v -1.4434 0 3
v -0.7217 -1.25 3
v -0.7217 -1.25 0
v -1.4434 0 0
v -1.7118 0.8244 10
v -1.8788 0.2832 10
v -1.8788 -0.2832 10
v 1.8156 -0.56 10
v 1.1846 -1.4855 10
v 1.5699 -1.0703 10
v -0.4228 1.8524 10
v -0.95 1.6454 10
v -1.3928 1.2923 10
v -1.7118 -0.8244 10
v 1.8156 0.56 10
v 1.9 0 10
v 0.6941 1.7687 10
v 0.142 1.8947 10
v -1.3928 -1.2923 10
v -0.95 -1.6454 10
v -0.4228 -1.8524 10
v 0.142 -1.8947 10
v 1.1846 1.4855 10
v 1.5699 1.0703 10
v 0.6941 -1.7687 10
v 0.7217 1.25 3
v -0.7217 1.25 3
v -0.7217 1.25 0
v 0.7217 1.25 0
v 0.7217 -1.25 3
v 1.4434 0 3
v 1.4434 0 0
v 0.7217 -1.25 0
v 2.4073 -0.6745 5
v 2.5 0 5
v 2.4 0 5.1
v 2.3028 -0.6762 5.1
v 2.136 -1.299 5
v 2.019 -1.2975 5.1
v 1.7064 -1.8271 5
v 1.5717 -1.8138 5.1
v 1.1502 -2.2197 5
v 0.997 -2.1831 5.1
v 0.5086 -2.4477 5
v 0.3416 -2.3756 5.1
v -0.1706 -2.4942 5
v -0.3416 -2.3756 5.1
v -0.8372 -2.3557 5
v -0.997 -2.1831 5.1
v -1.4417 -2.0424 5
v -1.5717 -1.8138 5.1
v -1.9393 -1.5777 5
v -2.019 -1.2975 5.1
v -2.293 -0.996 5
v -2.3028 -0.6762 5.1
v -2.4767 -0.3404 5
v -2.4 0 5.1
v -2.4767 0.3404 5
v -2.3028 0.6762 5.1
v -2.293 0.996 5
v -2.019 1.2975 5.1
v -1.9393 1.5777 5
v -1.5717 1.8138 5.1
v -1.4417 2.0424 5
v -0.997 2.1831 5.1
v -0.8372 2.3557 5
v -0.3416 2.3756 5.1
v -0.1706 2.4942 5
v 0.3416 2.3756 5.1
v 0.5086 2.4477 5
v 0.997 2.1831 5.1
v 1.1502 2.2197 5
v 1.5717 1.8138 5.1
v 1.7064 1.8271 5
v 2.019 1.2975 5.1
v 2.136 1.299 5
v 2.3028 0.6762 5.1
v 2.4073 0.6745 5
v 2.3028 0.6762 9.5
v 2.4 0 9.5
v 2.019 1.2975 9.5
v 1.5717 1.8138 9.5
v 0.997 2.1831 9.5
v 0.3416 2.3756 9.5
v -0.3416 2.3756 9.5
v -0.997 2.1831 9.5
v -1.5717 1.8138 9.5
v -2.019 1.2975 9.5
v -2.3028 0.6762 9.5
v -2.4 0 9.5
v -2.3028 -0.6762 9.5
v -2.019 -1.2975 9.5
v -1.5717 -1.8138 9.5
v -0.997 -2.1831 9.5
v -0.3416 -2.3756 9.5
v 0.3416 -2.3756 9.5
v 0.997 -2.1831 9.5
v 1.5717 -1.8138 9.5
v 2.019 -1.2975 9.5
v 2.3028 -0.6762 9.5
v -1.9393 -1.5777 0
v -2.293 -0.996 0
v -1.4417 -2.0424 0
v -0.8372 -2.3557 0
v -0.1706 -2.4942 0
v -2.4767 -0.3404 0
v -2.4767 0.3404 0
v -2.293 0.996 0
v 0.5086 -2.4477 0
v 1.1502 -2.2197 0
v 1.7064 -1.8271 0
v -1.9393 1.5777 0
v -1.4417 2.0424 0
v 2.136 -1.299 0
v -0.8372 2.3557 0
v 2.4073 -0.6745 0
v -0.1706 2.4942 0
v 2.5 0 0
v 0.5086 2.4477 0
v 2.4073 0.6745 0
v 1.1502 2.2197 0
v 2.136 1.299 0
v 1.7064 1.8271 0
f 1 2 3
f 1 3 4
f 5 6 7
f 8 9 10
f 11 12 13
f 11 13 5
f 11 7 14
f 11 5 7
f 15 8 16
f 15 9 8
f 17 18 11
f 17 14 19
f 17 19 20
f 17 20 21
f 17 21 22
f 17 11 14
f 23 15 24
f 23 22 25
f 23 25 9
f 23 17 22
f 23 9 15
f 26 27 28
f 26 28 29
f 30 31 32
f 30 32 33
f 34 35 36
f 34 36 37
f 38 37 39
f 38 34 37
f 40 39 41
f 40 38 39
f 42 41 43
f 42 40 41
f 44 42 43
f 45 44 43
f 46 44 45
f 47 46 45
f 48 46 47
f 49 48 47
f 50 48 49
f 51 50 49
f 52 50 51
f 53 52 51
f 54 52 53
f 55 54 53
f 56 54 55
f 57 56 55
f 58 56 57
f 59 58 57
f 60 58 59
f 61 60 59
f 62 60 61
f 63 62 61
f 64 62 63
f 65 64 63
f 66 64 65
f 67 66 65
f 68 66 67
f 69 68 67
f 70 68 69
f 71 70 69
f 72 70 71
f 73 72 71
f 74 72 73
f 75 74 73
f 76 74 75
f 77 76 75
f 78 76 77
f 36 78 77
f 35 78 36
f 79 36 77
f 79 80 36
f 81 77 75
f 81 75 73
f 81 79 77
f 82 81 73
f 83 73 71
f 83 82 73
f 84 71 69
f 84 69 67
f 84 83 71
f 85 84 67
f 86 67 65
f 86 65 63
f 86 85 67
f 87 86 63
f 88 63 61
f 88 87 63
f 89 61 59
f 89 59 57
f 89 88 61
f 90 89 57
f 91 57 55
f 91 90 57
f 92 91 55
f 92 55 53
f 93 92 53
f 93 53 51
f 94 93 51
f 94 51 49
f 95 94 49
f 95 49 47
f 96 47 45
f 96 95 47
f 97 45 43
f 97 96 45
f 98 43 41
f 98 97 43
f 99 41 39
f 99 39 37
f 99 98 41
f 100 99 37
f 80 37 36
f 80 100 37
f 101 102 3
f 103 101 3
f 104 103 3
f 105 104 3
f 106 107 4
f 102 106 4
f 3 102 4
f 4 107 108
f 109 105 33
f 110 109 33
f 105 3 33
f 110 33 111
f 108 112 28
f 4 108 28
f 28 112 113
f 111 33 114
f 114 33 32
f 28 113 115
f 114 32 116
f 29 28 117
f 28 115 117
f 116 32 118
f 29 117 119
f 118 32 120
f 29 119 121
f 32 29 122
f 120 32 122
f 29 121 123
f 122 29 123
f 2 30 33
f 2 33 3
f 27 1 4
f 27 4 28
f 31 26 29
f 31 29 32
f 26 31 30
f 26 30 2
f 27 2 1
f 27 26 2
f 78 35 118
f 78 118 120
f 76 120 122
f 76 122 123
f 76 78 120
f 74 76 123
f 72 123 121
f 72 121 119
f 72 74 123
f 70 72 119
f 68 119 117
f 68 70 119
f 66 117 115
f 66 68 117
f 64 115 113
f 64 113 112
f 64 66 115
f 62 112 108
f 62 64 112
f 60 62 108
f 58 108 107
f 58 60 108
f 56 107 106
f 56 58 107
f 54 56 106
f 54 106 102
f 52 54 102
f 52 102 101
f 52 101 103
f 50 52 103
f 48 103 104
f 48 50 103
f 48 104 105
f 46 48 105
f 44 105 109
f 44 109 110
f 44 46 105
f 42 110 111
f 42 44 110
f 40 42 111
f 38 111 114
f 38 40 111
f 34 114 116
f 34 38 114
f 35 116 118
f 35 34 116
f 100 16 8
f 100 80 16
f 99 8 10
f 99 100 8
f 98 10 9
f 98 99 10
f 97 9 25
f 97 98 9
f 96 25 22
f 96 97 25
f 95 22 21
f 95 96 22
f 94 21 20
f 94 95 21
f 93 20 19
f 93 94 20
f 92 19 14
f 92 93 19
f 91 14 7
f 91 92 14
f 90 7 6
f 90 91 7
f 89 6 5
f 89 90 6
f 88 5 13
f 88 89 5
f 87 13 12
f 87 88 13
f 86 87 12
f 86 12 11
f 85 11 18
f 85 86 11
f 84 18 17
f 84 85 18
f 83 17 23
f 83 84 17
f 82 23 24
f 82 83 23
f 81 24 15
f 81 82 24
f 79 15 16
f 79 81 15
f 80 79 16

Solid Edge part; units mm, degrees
sketch "Sketch1" plane through (0, 0, 0) normal (0, -1, 0) x (1, 0, 0)
  line L0 (2.5, 0) -> (2.5, 5)
  line L1 (2.5, 5) -> (2.4, 5.1)
  line L2 (2.4, 5.1) -> (2.4, 10)
  line L3 (2.4, 10) -> (0, 10)
  line L4 (2.5, 0) -> (0, 0)
  dimension "D1" = 5
  dimension "D2" = 10
revolve "RevolvedProtrusion1" add sketch "Sketch1" angle 360 about axis through (0, 0, 0) along (0, 0, 1)
sketch "Sketch2" plane through (0, 0, 0) normal (0, 0, -1) x (-1, 0, 0)
  line L0 (-0.7217, 1.25) -> (-1.4434, 0)
  line L1 (-1.4434, 0) -> (-0.7217, -1.25)
  line L2 (-0.7217, -1.25) -> (0.7217, -1.25)
  line L3 (0.7217, -1.25) -> (1.4434, 0)
  line L4 (1.4434, 0) -> (0.7217, 1.25)
  line L5 (0.7217, 1.25) -> (-0.7217, 1.25)
extrude "Cutout1" cut sketch "Sketch2" along normal mid plane 6
chamfer "Chamfer_1" distance 0.5 angle 45 1 edges at (-2.4, 0, 10)
cosmetic_thread "Thread1" size "M5"
properties material "Steel"
